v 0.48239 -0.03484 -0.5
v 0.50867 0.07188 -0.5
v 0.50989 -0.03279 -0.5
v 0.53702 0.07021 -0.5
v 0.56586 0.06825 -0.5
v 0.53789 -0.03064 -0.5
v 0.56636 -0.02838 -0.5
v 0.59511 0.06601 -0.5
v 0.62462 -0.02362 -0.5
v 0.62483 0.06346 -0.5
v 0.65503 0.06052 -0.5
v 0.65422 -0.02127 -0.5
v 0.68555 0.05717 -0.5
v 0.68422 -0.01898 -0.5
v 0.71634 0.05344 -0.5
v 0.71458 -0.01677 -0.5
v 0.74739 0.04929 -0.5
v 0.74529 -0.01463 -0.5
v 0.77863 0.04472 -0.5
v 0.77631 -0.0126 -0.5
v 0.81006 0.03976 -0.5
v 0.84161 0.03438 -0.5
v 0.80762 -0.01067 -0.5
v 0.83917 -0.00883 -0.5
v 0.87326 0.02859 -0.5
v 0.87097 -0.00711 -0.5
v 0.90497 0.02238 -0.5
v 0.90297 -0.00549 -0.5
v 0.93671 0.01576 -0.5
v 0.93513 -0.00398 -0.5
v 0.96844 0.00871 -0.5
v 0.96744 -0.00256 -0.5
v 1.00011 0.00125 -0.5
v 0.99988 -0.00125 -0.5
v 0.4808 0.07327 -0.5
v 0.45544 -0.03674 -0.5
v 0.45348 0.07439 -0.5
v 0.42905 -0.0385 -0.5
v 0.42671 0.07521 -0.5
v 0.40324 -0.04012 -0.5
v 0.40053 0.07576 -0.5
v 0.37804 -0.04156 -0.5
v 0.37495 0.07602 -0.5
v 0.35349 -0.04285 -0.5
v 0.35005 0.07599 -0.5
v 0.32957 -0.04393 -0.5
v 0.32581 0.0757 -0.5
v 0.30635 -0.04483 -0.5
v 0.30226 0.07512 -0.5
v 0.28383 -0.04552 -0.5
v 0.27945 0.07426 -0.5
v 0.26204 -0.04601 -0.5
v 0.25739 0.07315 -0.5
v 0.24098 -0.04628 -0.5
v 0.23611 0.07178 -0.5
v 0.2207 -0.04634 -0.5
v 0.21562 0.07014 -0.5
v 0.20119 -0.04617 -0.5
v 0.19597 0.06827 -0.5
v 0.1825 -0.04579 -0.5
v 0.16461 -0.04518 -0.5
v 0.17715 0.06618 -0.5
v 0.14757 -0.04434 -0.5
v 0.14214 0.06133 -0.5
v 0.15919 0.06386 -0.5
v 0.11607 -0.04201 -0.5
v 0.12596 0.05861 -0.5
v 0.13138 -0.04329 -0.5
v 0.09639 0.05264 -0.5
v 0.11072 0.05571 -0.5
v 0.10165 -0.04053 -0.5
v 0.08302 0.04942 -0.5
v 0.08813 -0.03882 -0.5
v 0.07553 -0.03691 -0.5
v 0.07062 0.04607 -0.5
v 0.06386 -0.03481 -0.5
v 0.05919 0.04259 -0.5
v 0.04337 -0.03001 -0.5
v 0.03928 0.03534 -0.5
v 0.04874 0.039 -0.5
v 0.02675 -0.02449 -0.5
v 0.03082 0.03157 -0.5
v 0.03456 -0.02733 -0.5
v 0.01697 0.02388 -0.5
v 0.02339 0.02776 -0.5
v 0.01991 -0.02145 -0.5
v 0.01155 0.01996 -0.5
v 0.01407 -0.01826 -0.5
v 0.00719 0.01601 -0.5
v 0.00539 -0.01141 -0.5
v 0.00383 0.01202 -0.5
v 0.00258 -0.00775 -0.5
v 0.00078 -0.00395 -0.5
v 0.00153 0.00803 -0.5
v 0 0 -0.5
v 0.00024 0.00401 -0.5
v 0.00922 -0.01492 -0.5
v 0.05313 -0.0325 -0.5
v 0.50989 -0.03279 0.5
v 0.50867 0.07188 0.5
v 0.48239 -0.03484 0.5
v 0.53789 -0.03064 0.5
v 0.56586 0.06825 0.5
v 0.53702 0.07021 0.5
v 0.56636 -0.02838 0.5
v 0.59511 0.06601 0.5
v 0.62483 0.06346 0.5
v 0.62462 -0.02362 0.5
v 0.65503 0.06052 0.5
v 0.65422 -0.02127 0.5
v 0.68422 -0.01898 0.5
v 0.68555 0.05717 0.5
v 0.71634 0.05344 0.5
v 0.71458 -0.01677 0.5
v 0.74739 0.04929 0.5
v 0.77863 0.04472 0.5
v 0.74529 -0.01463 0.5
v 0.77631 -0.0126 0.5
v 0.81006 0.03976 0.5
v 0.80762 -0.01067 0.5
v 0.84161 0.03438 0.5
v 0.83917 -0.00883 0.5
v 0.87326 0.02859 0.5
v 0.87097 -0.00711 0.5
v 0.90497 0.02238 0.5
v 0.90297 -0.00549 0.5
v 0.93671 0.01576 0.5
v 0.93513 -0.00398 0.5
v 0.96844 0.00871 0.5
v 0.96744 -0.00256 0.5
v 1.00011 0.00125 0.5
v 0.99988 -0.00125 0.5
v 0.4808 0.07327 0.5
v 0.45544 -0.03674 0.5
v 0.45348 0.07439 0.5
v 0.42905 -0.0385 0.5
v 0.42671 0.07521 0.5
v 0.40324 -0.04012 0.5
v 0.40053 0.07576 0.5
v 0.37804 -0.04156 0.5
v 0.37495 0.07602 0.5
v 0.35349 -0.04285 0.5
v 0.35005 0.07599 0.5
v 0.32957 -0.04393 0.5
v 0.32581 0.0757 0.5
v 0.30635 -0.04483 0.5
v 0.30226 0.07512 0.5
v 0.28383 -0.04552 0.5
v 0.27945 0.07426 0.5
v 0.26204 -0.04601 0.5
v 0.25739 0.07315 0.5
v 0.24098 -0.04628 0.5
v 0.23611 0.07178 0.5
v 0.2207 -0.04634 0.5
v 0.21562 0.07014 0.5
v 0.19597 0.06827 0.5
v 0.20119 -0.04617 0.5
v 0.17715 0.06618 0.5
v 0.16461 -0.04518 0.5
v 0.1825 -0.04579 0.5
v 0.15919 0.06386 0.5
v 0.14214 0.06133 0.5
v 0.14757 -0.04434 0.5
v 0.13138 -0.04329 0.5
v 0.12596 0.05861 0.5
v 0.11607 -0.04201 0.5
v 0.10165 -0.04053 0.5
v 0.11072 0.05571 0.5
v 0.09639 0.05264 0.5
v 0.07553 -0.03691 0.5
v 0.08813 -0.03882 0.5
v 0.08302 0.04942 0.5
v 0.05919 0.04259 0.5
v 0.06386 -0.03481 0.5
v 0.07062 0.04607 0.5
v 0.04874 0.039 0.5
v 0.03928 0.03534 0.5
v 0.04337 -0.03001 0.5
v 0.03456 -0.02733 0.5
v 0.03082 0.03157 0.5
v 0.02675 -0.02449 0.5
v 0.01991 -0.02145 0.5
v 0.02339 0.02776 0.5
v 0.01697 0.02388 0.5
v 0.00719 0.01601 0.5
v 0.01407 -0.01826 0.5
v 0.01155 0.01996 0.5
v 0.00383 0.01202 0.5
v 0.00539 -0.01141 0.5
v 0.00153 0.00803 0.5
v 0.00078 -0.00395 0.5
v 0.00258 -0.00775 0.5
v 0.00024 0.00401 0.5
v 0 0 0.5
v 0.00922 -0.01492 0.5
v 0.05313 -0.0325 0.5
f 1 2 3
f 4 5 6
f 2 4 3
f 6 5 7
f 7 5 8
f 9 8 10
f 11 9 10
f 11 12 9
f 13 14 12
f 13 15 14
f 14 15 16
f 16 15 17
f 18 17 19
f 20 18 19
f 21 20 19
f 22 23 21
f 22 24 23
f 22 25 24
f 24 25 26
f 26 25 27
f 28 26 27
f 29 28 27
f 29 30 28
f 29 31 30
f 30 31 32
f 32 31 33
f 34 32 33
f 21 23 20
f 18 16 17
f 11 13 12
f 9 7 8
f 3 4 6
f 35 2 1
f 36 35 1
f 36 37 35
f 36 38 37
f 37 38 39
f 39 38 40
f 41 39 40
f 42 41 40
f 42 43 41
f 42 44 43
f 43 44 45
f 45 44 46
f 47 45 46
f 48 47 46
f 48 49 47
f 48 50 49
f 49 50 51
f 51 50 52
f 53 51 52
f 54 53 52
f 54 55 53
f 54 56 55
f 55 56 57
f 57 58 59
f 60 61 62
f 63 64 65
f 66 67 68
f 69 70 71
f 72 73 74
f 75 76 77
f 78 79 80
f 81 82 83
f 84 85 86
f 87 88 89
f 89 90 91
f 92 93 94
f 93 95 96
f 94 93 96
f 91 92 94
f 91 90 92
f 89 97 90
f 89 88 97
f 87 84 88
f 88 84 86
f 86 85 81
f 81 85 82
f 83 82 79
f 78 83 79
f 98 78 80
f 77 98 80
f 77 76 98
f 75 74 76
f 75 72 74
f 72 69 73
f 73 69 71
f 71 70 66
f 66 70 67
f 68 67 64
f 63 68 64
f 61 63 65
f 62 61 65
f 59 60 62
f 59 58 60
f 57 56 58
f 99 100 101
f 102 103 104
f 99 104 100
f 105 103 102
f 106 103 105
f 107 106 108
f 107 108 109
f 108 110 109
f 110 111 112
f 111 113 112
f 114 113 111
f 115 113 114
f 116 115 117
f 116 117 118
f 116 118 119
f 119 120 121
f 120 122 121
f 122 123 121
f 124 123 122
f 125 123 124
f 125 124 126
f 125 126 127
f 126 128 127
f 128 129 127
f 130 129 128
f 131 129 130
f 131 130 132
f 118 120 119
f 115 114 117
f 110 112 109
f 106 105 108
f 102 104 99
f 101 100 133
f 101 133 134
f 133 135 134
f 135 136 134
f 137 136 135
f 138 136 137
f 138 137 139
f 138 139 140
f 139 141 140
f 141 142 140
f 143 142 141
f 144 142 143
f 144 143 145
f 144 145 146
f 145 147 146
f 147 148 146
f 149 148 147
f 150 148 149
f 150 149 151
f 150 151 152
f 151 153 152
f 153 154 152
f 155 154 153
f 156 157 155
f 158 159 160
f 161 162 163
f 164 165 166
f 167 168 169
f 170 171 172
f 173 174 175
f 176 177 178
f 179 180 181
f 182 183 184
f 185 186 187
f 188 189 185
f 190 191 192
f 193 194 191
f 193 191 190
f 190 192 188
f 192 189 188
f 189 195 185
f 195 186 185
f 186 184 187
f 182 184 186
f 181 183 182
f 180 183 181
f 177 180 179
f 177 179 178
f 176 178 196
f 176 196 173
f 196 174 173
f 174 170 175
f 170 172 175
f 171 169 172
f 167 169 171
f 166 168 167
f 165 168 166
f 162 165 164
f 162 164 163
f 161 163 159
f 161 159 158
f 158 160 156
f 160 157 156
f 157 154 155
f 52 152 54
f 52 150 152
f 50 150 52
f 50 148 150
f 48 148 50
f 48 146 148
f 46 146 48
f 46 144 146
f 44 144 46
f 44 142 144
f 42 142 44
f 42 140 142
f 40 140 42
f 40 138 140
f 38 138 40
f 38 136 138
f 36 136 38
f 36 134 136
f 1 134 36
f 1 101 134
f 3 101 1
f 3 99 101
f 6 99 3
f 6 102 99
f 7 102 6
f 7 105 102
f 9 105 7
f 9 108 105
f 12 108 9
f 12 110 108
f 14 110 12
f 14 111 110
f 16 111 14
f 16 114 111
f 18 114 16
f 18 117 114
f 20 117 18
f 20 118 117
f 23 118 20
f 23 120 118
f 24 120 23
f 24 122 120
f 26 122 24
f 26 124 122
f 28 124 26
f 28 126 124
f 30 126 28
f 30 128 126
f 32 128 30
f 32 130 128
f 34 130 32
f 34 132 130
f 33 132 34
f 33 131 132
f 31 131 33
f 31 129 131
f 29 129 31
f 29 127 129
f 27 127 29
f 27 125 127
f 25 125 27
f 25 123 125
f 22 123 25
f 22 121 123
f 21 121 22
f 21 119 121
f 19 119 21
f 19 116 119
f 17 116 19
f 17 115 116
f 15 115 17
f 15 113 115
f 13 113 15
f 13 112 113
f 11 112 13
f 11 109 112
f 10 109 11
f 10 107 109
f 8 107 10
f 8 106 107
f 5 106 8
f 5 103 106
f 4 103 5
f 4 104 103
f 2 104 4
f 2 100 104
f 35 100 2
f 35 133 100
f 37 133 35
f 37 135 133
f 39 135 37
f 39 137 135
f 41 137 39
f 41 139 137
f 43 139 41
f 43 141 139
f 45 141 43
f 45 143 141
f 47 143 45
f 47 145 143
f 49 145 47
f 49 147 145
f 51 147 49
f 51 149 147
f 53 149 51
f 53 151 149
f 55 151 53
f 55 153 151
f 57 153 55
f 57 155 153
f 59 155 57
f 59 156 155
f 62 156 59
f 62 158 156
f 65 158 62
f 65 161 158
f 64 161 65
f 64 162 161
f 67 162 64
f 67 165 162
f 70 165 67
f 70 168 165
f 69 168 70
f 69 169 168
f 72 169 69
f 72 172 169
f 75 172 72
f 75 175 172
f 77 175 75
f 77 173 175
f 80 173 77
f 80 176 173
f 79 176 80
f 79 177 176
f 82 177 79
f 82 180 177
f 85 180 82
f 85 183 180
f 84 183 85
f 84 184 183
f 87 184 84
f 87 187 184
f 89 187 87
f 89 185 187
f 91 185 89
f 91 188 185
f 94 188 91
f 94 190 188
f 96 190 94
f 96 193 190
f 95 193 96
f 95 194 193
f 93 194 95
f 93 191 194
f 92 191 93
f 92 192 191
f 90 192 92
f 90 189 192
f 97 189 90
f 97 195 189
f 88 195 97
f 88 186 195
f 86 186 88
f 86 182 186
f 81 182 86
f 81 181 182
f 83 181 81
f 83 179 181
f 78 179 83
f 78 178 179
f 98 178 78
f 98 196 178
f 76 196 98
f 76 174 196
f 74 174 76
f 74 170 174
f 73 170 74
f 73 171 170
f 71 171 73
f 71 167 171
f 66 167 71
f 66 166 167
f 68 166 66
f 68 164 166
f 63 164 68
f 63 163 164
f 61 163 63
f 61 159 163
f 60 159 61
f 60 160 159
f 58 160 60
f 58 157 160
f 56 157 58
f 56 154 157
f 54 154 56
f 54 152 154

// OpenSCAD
//	module airfoil() default to NACA-8412
//	camber_max - percent figure. ( range 0-9 )
//	camber_position - tenths   ( range 0-9 )
//	thickness - percentage relative to chord   ( range 0-99 )

//The module has default values of camber_max = 8, camber_position = 4, thickness = 12 
//these can be changed after when whe use the module
module airfoil(camber_max = 8, camber_position = 4, thickness = 12) 
{

	m = camber_max/100;
	p = camber_position/10;
	t = thickness/100;
	
//	pts = 25; // datapoints on each of upper and lower surfaces
	pts = 50; // datapoints on each of upper and lower surfaces
	
	function xx(i) = 1 - cos((i-1)*90/(pts-1));
	function yt(i) = t/0.2*(0.2969*pow(xx(i),0.5) - 0.126*xx(i)-0.3516*pow(xx(i),2) + 0.2843*pow(xx(i),3) - 0.1015*pow(xx(i),4));
	function yc(i) = xx(i)<p ? m/pow(p,2)*(2*p*xx(i) - pow(xx(i),2)) : m/pow(1-p,2)*(1 - 2*p + 2*p*xx(i) - pow(xx(i),2));
	function xu(j) = xx(j) - yt(j)*(sin(atan((yc(j)-yc(j-1))/(xx(j)-xx(j-1)))));
	function yu(j) = yc(j) + yt(j)*(cos(atan((yc(j)-yc(j-1))/(xx(j)-xx(j-1)))));
	function xl(j) = xx(j) + yt(j)*(sin(atan((yc(j)-yc(j-1))/(xx(j)-xx(j-1)))));
	function yl(j) = yc(j) - yt(j)*(cos(atan((yc(j)-yc(j-1))/(xx(j)-xx(j-1)))));

	polygon( points=[ 
 	// upper side front-to-back
	// here you need to define the same amount of panels as in pts
	[0,0],[xu(2),yu(2)],[xu(3),yu(3)],[xu(4),yu(4)],[xu(5),yu(5)],[xu(6),yu(6)],[xu(7),yu(7)],[xu(8),yu(8)],[xu(9),yu(9)],[xu(10),yu(10)],[xu(11),yu(11)],[xu(12),yu(12)],[xu(13),yu(13)],[xu(14),yu(14)],[xu(15),yu(15)],[xu(16),yu(16)],[xu(17),yu(17)],[xu(18),yu(18)],[xu(19),yu(19)],[xu(20),yu(20)],[xu(21),yu(21)],[xu(22),yu(22)],[xu(23),yu(23)],[xu(24),yu(24)],[xu(25),yu(25)],[xu(26),yu(26)],[xu(27),yu(27)],[xu(28),yu(28)],[xu(29),yu(29)],[xu(30),yu(30)],[xu(31),yu(31)],[xu(32),yu(32)],[xu(33),yu(33)],[xu(34),yu(34)],[xu(35),yu(35)],[xu(36),yu(36)],[xu(37),yu(37)],[xu(38),yu(38)],[xu(39),yu(39)],[xu(40),yu(40)],[xu(41),yu(41)],[xu(42),yu(42)],[xu(43),yu(43)],[xu(44),yu(44)],[xu(45),yu(45)],[xu(46),yu(46)],[xu(47),yu(47)],[xu(48),yu(48)],[xu(49),yu(49)],[xu(50),yu(50)],

	// lower side back to front
	// here you need to define the same amount of panels as in pts
	[xl(50),yl(50)],[xl(49),yl(49)],[xl(48),yl(48)],[xl(47),yl(47)],[xl(46),yl(46)],[xl(45),yl(45)],[xl(44),yl(44)],[xl(43),yl(43)],[xl(42),yl(42)],[xl(41),yl(41)],[xl(40),yl(40)],[xl(39),yl(39)],[xl(38),yl(38)],[xl(37),yl(37)],[xl(36),yl(36)],[xl(35),yl(35)],[xl(34),yl(34)],[xl(33),yl(33)],[xl(32),yl(32)],[xl(31),yl(31)],[xl(30),yl(30)],[xl(29),yl(29)],[xl(28),yl(28)],[xl(27),yl(27)],[xl(26),yl(26)],[xl(25),yl(25)],[xl(24),yl(24)],[xl(23),yl(23)],[xl(22),yl(22)],[xl(21),yl(21)],[xl(20),yl(20)],[xl(19),yl(19)],[xl(18),yl(18)],[xl(17),yl(17)],[xl(16),yl(16)],[xl(15),yl(15)],[xl(14),yl(14)],[xl(13),yl(13)],[xl(12),yl(12)],[xl(11),yl(11)],[xl(10),yl(10)],[xl(9),yl(9)],[xl(8),yl(8)],[xl(7),yl(7)],[xl(6),yl(6)],[xl(5),yl(5)],[xl(4),yl(4)],[xl(3),yl(3)],[xl(2),yl(2)],[0,0]
	] ); 
}


//airfoil(); 
//airfoil(8,4,12);

//We made a linear extrusion of airfoil to crete the 3d body, at this point we can change the default values
$fn=100;

curvature=2;
curvature_position=6;
airfoil_thickness=12;

linear_extrude(height = 1, center = true,convexity = 10)
{
airfoil(curvature,curvature_position,airfoil_thickness);
} 
